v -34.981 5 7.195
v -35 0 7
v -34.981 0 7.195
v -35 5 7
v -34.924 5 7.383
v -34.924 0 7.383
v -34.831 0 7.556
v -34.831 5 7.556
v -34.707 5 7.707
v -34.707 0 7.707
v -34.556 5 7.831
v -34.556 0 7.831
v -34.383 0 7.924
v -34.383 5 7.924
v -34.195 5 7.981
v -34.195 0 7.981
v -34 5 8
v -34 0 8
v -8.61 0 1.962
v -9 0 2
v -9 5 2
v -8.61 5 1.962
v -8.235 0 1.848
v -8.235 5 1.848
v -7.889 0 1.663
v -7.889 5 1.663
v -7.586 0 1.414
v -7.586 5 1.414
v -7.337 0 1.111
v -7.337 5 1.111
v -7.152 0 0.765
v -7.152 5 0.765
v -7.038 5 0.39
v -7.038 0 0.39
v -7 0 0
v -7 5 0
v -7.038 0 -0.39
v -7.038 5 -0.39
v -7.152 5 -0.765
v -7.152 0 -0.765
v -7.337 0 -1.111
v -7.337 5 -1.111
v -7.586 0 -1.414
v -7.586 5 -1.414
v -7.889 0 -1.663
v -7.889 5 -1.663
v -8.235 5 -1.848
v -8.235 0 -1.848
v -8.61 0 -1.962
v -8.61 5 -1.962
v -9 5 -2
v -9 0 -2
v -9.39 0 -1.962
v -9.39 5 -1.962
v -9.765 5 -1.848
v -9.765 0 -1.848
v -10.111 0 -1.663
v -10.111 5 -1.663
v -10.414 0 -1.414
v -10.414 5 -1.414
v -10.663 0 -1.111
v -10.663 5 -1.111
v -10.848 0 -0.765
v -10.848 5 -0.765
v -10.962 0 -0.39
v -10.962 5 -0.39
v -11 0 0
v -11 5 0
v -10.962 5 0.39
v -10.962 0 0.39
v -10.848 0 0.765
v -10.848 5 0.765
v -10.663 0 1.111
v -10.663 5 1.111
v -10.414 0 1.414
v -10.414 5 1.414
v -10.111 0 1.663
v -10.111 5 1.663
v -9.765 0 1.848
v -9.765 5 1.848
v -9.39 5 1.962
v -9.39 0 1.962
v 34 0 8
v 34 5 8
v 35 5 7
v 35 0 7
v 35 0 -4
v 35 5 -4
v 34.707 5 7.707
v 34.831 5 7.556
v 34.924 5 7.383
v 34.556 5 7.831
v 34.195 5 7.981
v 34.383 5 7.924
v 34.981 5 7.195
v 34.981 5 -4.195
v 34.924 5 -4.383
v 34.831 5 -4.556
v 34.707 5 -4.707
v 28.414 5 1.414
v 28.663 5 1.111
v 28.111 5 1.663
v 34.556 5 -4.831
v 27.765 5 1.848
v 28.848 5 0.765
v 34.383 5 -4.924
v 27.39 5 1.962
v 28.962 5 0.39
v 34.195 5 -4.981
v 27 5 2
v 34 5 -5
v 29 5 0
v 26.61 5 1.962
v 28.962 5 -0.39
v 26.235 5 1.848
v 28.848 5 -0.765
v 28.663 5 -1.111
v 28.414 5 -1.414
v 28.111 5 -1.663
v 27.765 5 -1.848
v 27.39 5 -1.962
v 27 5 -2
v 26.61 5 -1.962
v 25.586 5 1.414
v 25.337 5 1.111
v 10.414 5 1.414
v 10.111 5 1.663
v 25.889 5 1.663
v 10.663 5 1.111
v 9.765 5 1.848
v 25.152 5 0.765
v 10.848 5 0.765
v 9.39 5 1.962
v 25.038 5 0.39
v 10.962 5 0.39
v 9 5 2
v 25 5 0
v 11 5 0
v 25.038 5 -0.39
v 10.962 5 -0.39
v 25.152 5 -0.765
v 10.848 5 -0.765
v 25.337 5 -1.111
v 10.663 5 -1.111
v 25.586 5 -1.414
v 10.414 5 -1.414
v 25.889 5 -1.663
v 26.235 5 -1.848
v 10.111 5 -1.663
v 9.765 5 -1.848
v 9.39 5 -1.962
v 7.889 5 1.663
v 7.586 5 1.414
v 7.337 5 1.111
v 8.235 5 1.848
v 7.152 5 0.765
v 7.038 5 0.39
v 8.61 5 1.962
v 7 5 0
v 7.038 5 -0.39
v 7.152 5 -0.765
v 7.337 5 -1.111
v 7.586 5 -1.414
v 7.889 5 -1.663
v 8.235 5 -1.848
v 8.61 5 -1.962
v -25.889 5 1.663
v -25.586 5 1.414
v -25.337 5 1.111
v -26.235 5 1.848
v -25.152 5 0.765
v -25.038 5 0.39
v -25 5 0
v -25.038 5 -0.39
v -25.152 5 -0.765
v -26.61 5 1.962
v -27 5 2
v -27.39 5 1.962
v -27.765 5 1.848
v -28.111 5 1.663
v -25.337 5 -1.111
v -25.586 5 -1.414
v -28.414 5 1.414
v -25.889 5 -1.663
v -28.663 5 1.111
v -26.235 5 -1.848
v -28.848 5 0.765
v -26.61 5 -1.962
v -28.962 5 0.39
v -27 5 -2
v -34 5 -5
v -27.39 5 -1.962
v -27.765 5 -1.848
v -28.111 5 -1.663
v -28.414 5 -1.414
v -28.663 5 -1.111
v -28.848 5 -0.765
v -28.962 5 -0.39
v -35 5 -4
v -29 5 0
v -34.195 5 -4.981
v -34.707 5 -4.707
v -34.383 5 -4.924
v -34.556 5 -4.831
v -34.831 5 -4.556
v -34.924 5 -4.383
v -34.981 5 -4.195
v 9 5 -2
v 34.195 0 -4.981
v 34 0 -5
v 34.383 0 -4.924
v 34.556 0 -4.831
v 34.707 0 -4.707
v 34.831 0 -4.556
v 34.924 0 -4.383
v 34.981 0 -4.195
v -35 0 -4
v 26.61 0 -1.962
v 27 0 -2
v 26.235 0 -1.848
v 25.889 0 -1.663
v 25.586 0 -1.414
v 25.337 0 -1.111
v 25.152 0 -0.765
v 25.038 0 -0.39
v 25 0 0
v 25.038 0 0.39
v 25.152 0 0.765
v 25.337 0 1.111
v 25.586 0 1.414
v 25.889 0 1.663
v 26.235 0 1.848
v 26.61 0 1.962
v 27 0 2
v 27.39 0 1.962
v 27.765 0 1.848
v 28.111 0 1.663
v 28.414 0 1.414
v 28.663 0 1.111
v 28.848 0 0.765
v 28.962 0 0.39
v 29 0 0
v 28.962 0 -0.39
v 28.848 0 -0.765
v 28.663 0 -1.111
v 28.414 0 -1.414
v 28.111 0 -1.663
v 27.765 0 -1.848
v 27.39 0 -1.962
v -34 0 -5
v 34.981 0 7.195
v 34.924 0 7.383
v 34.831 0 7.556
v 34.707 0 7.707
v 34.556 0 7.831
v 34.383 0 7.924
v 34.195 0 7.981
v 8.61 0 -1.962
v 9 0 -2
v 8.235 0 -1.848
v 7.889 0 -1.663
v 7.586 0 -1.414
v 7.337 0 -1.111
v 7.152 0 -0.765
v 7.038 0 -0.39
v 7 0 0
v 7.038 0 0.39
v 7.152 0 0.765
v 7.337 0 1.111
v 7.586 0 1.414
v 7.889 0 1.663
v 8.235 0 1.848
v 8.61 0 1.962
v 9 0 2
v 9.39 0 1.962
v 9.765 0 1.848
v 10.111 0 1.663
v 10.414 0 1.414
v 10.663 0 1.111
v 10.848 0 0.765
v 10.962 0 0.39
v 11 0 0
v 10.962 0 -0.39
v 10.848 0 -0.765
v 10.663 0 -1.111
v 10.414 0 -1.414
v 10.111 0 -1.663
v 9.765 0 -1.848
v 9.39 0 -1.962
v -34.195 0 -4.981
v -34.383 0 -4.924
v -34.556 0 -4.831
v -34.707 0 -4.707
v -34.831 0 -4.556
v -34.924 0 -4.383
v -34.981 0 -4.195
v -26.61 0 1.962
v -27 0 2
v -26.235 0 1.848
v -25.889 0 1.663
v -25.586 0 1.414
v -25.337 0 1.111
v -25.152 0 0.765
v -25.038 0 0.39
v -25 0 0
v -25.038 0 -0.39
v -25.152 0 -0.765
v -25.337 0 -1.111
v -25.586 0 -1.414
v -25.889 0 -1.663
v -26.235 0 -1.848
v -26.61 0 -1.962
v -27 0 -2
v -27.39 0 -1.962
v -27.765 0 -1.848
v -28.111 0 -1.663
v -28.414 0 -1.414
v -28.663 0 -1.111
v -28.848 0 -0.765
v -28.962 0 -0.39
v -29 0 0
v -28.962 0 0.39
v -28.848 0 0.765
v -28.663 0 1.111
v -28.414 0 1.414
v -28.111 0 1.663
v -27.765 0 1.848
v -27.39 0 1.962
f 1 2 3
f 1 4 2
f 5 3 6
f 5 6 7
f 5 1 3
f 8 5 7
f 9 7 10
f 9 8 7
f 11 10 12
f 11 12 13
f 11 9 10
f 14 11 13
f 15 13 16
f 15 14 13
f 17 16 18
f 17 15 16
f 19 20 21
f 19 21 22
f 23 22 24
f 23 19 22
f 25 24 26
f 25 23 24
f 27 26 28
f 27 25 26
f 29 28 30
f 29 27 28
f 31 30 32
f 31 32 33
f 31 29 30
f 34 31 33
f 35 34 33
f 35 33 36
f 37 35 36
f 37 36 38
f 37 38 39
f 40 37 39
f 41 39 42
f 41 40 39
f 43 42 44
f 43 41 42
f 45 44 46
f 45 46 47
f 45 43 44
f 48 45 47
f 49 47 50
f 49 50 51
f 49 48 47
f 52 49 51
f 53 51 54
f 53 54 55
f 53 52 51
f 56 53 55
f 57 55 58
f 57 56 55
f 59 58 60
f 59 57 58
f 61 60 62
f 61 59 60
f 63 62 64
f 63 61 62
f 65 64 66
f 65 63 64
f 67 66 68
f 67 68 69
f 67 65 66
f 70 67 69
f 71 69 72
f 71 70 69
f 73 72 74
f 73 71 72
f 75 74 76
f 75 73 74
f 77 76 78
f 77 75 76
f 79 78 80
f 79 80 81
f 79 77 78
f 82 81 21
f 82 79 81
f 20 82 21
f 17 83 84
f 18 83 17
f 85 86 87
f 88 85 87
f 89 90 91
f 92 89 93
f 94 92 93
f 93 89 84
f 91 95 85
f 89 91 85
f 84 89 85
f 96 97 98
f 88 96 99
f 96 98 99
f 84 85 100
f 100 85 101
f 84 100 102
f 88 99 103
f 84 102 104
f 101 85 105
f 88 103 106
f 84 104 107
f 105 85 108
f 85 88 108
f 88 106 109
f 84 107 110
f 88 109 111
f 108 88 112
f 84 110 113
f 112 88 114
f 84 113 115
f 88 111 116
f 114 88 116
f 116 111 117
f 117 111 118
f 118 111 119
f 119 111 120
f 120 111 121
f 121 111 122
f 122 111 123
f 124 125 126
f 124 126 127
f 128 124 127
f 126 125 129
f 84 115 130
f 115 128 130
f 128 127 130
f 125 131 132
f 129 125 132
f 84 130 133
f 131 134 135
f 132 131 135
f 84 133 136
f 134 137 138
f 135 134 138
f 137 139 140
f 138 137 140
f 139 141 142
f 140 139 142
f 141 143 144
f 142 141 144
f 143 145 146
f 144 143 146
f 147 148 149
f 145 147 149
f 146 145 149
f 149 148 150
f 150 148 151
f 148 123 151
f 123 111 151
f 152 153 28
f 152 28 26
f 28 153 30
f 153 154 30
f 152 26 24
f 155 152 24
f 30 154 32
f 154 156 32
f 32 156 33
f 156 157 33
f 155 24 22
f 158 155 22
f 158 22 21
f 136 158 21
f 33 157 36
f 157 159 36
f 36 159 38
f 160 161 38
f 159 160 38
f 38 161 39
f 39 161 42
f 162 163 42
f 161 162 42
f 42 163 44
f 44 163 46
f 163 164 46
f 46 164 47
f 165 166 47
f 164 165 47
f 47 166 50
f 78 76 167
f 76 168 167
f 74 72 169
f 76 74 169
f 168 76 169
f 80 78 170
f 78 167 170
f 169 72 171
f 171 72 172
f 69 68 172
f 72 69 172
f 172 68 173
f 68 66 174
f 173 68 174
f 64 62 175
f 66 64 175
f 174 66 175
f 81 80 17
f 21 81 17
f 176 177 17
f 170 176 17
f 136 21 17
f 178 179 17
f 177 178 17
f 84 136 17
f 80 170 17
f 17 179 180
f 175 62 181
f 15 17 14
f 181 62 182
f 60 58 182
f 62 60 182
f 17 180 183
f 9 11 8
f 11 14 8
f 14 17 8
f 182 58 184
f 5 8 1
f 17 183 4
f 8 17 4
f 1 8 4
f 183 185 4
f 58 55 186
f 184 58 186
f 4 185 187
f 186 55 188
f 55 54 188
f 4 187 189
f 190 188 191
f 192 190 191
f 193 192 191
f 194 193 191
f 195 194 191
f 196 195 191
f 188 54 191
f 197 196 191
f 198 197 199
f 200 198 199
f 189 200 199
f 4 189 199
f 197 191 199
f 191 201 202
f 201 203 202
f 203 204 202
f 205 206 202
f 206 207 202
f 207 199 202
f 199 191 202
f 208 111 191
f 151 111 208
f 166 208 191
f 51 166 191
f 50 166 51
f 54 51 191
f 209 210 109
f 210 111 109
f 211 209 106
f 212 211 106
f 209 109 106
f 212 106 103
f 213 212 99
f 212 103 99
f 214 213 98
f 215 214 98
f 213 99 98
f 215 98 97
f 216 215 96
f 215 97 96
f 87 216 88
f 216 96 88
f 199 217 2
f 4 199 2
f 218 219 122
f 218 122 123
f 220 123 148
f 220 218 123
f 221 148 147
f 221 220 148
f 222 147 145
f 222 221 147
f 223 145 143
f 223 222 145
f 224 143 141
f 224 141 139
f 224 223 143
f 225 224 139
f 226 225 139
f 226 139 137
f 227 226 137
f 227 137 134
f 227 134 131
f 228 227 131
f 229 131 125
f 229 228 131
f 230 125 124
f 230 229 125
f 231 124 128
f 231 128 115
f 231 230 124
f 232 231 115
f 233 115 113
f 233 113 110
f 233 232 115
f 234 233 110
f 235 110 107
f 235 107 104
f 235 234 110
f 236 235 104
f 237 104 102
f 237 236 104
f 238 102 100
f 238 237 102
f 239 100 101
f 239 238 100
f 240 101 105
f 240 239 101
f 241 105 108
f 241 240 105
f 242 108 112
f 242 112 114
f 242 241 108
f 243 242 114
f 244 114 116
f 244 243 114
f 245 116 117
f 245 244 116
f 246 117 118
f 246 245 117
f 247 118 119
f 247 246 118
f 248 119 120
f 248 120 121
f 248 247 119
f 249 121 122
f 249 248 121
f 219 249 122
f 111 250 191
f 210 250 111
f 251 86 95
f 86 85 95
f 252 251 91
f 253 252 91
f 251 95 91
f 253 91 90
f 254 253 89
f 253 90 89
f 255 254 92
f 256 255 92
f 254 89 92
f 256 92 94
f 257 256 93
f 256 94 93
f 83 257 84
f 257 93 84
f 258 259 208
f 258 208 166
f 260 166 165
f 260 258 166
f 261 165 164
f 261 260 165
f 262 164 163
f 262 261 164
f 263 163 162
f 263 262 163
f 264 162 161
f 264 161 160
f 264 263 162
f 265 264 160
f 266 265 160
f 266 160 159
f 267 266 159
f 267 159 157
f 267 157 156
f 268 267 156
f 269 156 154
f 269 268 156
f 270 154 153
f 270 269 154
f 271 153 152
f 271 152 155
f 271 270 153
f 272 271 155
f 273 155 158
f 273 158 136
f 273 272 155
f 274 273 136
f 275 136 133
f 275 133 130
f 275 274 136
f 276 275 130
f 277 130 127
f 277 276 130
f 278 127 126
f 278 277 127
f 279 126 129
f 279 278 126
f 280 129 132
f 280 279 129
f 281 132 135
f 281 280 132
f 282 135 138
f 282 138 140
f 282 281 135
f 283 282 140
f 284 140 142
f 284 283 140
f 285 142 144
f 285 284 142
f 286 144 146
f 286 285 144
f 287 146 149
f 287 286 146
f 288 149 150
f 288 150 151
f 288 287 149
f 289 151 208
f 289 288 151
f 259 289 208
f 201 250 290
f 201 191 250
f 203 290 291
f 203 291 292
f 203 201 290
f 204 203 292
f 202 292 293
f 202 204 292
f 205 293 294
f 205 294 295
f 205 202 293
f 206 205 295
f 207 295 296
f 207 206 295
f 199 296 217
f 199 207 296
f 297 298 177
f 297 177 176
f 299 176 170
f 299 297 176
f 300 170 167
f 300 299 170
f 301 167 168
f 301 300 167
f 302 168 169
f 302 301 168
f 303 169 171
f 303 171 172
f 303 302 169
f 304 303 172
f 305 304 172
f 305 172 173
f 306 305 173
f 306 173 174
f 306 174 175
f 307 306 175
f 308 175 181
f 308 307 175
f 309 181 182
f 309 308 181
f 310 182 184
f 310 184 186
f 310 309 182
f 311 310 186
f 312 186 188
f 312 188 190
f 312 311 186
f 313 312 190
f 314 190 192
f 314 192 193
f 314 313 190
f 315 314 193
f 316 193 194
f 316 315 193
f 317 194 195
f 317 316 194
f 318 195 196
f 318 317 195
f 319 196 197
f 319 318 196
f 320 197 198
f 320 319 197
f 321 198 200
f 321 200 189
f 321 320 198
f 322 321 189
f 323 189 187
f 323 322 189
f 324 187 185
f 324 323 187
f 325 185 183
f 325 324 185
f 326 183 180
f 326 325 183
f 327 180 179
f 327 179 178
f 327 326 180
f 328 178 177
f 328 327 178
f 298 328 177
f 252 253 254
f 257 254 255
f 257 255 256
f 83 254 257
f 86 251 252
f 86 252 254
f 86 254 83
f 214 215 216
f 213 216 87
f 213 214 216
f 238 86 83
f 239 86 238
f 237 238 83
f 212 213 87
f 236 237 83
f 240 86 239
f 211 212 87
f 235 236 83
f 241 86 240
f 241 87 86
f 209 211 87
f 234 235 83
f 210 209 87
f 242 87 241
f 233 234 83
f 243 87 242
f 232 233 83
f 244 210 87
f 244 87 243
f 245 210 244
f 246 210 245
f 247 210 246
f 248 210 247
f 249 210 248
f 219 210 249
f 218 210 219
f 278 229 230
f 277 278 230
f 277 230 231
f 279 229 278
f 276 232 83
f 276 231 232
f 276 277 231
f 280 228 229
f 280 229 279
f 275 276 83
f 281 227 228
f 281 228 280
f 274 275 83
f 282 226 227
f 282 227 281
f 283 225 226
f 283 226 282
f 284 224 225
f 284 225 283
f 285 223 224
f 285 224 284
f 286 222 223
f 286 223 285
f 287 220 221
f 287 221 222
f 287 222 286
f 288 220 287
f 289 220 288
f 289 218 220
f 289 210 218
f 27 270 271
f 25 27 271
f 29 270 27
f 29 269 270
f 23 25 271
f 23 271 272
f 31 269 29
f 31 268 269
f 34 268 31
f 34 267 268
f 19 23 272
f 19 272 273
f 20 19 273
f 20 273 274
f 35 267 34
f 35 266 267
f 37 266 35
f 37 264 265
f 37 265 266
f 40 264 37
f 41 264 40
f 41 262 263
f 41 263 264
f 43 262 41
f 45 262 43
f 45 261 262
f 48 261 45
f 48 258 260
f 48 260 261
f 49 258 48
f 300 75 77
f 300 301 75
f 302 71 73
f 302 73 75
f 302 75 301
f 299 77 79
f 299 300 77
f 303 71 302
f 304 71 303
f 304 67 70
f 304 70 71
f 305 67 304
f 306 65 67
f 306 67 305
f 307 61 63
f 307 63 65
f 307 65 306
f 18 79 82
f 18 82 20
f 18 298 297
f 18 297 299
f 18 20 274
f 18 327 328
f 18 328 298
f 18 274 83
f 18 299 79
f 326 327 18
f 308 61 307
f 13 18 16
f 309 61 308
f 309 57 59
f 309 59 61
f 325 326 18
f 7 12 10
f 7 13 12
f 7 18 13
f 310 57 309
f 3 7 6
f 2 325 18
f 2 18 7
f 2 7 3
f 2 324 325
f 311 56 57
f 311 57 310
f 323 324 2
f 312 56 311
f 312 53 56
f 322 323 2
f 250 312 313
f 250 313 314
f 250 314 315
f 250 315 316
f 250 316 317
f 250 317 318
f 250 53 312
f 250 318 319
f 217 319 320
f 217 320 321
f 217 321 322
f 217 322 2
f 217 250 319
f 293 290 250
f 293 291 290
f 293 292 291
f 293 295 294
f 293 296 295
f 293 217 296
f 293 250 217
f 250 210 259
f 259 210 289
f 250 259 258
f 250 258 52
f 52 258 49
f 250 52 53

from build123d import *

# Parameters (mm, degrees)
SKETCH_1_R      = 2
EXTRUDE_1_DEPTH = 5
FILLET_1_R      = 1


with BuildPart() as part:
    # 草图1 → 凸台-拉伸1 (new body)
    with BuildSketch(Plane(origin=(0, 0, 0), x_dir=(1, 0, 0), z_dir=(0, 1, 0))):
        Polygon((-35, 5), (35, 5), (35, -5), (35, -8), (-35, -8), (-35, -5), align=None)
        with Locations(Location((-27, 0, 0), (0, 0, 270))):
            Circle(SKETCH_1_R, mode=Mode.SUBTRACT)
        with Locations(Location((-9, 0, 0), (0, 0, 270))):
            Circle(SKETCH_1_R, mode=Mode.SUBTRACT)
        with Locations(Location((9, 0, 0), (0, 0, 90))):
            Circle(SKETCH_1_R, mode=Mode.SUBTRACT)
        with Locations(Location((27, 0, 0), (0, 0, 90))):
            Circle(SKETCH_1_R, mode=Mode.SUBTRACT)
    extrude(amount=EXTRUDE_1_DEPTH)

    # 圆角1
    fillet_1_edges = [part.edges().sort_by_distance(p)[0] for p in [
        (35, 2.5, 8),
        (-35, 2.5, 8),
        (-35, 2.5, -5),
        (35, 2.5, -5),
    ]]
    fillet(fillet_1_edges, radius=FILLET_1_R)


solid = part.part
